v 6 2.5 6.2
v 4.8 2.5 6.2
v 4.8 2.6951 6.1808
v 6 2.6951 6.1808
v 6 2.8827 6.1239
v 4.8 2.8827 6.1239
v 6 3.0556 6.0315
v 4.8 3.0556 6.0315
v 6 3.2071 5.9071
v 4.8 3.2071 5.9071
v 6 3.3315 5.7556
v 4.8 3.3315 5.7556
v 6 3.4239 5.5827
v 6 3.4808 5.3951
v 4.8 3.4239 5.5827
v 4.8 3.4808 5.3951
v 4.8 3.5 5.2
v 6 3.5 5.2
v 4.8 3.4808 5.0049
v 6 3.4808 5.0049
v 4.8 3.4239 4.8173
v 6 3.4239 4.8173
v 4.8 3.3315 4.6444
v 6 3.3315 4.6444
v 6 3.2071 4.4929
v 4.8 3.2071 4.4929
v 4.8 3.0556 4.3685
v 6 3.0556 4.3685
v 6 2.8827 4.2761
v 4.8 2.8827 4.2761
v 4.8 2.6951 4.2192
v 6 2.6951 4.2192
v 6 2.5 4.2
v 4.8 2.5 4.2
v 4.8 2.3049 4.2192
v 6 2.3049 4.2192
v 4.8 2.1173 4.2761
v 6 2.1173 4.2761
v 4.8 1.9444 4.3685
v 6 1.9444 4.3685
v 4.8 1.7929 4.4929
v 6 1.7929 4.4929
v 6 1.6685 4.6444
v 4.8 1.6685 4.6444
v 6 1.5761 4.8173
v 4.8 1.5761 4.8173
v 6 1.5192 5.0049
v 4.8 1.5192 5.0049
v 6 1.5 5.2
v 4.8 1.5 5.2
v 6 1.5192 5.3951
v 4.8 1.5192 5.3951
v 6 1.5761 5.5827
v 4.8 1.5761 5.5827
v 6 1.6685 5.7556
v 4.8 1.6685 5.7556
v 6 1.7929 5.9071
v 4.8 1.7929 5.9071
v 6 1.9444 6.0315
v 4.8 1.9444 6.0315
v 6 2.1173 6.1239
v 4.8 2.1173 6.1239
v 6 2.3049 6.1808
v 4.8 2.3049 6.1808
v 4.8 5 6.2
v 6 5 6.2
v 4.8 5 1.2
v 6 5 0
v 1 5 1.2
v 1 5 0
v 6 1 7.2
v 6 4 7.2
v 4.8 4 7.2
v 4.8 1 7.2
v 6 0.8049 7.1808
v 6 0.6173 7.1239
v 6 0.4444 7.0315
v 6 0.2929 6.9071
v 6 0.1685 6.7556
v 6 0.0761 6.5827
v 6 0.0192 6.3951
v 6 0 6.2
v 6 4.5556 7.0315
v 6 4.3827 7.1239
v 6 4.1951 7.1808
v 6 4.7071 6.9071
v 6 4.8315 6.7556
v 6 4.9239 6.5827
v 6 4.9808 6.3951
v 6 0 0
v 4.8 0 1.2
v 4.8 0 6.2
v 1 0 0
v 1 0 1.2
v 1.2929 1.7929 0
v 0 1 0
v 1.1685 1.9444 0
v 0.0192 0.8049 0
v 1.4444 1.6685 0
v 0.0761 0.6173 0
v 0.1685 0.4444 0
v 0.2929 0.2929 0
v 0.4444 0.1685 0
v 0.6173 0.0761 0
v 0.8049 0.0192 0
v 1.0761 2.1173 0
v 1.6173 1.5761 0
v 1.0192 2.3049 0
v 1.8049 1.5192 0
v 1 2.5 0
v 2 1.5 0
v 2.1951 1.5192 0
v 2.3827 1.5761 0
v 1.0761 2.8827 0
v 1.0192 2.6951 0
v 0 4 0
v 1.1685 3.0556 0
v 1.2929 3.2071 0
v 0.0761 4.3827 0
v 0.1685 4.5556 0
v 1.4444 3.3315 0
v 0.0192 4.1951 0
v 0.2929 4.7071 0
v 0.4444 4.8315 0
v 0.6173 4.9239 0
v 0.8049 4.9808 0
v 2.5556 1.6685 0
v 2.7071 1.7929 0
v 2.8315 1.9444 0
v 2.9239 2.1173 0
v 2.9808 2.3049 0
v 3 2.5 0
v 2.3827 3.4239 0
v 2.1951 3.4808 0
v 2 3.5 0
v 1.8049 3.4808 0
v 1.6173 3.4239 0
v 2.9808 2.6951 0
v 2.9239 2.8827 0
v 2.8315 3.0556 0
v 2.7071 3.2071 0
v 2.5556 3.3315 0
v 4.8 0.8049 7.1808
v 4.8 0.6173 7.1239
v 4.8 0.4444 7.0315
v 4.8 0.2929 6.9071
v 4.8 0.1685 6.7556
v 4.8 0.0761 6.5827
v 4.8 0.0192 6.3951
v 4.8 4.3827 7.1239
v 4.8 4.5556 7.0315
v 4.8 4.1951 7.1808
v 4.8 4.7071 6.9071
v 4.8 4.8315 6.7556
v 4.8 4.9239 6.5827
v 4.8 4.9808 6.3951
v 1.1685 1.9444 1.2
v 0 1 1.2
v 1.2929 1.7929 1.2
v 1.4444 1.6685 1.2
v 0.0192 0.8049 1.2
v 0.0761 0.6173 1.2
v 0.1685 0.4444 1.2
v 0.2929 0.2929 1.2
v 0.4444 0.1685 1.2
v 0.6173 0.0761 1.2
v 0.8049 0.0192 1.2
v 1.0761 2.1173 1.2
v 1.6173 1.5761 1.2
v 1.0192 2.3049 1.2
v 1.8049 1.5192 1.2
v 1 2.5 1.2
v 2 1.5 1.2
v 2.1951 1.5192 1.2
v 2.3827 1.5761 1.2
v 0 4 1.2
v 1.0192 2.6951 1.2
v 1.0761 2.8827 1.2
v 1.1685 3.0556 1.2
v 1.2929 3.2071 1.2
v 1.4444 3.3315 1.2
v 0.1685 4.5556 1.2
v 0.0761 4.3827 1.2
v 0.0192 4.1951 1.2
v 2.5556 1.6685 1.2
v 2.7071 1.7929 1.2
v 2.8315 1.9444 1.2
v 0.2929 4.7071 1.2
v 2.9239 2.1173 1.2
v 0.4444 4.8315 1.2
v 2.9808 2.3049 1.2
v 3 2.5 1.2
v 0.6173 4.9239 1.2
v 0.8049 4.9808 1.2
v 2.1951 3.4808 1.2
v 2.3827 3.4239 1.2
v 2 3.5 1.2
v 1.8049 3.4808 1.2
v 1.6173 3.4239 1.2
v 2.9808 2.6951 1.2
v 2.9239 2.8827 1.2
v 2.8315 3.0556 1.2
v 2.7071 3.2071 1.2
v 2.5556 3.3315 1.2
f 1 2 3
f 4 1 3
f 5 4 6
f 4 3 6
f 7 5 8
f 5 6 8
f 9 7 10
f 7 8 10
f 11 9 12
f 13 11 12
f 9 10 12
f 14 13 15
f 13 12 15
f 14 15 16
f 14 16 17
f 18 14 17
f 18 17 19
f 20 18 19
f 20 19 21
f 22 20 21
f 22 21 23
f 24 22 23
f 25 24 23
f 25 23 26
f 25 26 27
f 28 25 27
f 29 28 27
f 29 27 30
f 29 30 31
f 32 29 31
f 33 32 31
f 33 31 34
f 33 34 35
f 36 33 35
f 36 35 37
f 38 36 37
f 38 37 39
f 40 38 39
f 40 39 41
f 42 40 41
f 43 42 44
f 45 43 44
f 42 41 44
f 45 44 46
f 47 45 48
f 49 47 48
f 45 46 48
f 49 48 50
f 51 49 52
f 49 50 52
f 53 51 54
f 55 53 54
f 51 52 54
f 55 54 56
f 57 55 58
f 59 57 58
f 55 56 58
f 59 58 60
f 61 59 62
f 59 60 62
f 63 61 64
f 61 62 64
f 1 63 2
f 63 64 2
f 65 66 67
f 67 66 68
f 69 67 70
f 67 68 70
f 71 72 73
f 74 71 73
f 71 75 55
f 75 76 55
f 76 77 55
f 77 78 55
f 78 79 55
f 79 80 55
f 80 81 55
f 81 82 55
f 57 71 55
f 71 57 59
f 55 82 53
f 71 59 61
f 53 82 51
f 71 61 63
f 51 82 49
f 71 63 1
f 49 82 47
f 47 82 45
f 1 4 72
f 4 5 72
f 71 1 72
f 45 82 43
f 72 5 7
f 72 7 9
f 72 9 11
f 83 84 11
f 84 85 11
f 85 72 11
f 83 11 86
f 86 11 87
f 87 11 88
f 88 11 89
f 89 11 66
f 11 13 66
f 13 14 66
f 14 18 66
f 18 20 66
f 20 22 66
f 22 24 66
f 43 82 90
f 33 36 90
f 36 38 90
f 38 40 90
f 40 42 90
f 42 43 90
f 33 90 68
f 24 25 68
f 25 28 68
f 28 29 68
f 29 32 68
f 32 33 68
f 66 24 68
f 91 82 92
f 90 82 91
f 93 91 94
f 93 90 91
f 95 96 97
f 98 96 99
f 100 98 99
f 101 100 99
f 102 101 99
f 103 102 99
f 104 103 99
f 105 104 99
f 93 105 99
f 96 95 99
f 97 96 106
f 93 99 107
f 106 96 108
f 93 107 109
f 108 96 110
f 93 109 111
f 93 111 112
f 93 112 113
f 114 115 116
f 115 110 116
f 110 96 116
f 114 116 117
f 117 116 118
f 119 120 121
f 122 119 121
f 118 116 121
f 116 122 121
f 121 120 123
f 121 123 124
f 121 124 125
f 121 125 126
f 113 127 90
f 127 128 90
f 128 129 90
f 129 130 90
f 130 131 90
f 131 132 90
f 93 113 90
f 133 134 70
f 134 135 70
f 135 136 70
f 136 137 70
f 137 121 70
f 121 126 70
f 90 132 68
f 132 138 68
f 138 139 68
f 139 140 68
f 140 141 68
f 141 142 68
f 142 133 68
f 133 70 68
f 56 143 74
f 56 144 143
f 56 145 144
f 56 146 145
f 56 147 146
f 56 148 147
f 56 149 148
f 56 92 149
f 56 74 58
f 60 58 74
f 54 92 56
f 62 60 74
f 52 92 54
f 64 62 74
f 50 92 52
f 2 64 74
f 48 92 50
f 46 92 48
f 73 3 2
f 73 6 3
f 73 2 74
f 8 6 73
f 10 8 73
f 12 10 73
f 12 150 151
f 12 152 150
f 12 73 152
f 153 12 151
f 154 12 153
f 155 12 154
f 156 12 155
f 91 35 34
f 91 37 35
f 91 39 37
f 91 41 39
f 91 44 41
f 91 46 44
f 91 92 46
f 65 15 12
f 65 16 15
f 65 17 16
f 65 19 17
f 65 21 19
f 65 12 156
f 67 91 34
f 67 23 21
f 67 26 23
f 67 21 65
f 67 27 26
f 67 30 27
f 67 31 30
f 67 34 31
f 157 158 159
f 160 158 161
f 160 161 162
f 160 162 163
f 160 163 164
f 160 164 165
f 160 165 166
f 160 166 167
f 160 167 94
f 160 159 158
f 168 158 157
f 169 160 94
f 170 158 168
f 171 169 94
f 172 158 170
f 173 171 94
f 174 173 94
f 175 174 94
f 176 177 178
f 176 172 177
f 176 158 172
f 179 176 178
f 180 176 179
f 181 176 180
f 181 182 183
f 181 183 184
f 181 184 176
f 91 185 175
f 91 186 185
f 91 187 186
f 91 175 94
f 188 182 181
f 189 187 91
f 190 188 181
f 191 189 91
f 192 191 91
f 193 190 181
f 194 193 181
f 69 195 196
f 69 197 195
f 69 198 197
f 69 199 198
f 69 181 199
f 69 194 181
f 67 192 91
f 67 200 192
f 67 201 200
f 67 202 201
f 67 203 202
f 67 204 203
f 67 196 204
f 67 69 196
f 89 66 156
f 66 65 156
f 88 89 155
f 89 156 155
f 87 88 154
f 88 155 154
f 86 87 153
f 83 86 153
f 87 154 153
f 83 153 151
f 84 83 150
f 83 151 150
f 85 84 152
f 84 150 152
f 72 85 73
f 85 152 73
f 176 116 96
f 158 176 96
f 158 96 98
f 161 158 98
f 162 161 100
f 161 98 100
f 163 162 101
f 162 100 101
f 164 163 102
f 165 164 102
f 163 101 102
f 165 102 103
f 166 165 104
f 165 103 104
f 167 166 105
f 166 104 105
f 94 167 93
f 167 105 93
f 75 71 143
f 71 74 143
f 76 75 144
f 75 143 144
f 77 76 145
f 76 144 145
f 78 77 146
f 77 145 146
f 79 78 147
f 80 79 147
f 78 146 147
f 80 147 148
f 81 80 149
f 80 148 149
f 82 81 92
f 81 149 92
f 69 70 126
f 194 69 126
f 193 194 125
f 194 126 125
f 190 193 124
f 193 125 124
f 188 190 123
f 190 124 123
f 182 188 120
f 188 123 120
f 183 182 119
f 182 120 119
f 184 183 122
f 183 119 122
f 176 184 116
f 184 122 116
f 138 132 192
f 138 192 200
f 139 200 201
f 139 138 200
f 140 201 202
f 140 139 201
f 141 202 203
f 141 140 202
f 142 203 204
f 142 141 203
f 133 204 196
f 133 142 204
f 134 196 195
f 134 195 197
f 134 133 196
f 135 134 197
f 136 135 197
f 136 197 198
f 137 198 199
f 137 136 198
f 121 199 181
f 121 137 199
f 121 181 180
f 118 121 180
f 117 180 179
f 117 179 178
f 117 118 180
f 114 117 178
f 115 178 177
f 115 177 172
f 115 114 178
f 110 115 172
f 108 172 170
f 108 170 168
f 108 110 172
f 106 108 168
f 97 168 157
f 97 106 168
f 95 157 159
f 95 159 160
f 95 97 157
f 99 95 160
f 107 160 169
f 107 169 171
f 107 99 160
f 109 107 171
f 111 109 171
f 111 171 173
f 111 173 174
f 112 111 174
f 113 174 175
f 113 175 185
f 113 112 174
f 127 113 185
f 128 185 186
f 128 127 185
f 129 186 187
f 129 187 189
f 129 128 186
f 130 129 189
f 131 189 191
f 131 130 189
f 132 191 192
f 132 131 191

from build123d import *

# Parameters (mm, degrees)
SKETCH_1_R          = 1
EXTRUDE_1_DEPTH     = 1.2
SKETCH_2_W          = 1.2
SKETCH_2_H          = 5
EXTRUDE_2_DEPTH     = 6
FILLET_1_R          = 1
SKETCH_4_R          = 1
CUT_EXTRUDE_1_DEPTH = 2


with BuildPart() as part:
    # 草图1 → 凸台-拉伸1 (new body)
    with BuildSketch(Plane.XY):
        with BuildLine():
            Line((1, 0), (6, 0))
            Line((6, 0), (6, 5))
            Line((6, 5), (1, 5))
            ThreePointArc((1, 5), (0.292893219, 4.707106781), (0, 4))
            Line((0, 4), (0, 1))
            ThreePointArc((0, 1), (0.292893219, 0.292893219), (1, 0))
        make_face()
        with Locations((2, 2.5)):
            Circle(SKETCH_1_R, mode=Mode.SUBTRACT)
    extrude(amount=EXTRUDE_1_DEPTH)

    # 草图2 → 凸台-拉伸2 (add)
    with BuildSketch(Plane(origin=(0, 0, 1.2), x_dir=(-1, 0, 0), z_dir=(0, 0, -1))):
        with Locations((-5.4, 2.5)):
            Rectangle(SKETCH_2_W, SKETCH_2_H)
    extrude(amount=-EXTRUDE_2_DEPTH)

    # 圆角1
    fillet_1_edges = [part.edges().sort_by_distance(p)[0] for p in [
        (5.4, 0, 7.2),
        (5.4, 5, 7.2),
    ]]
    fillet(fillet_1_edges, radius=FILLET_1_R)

    # 草图4 → 切除-拉伸1 (cut)
    with BuildSketch(Plane.ZY.offset(-4.8)):
        with Locations((5.2, 2.5)):
            Circle(SKETCH_4_R)
    extrude(amount=-CUT_EXTRUDE_1_DEPTH, mode=Mode.SUBTRACT)


solid = part.part
